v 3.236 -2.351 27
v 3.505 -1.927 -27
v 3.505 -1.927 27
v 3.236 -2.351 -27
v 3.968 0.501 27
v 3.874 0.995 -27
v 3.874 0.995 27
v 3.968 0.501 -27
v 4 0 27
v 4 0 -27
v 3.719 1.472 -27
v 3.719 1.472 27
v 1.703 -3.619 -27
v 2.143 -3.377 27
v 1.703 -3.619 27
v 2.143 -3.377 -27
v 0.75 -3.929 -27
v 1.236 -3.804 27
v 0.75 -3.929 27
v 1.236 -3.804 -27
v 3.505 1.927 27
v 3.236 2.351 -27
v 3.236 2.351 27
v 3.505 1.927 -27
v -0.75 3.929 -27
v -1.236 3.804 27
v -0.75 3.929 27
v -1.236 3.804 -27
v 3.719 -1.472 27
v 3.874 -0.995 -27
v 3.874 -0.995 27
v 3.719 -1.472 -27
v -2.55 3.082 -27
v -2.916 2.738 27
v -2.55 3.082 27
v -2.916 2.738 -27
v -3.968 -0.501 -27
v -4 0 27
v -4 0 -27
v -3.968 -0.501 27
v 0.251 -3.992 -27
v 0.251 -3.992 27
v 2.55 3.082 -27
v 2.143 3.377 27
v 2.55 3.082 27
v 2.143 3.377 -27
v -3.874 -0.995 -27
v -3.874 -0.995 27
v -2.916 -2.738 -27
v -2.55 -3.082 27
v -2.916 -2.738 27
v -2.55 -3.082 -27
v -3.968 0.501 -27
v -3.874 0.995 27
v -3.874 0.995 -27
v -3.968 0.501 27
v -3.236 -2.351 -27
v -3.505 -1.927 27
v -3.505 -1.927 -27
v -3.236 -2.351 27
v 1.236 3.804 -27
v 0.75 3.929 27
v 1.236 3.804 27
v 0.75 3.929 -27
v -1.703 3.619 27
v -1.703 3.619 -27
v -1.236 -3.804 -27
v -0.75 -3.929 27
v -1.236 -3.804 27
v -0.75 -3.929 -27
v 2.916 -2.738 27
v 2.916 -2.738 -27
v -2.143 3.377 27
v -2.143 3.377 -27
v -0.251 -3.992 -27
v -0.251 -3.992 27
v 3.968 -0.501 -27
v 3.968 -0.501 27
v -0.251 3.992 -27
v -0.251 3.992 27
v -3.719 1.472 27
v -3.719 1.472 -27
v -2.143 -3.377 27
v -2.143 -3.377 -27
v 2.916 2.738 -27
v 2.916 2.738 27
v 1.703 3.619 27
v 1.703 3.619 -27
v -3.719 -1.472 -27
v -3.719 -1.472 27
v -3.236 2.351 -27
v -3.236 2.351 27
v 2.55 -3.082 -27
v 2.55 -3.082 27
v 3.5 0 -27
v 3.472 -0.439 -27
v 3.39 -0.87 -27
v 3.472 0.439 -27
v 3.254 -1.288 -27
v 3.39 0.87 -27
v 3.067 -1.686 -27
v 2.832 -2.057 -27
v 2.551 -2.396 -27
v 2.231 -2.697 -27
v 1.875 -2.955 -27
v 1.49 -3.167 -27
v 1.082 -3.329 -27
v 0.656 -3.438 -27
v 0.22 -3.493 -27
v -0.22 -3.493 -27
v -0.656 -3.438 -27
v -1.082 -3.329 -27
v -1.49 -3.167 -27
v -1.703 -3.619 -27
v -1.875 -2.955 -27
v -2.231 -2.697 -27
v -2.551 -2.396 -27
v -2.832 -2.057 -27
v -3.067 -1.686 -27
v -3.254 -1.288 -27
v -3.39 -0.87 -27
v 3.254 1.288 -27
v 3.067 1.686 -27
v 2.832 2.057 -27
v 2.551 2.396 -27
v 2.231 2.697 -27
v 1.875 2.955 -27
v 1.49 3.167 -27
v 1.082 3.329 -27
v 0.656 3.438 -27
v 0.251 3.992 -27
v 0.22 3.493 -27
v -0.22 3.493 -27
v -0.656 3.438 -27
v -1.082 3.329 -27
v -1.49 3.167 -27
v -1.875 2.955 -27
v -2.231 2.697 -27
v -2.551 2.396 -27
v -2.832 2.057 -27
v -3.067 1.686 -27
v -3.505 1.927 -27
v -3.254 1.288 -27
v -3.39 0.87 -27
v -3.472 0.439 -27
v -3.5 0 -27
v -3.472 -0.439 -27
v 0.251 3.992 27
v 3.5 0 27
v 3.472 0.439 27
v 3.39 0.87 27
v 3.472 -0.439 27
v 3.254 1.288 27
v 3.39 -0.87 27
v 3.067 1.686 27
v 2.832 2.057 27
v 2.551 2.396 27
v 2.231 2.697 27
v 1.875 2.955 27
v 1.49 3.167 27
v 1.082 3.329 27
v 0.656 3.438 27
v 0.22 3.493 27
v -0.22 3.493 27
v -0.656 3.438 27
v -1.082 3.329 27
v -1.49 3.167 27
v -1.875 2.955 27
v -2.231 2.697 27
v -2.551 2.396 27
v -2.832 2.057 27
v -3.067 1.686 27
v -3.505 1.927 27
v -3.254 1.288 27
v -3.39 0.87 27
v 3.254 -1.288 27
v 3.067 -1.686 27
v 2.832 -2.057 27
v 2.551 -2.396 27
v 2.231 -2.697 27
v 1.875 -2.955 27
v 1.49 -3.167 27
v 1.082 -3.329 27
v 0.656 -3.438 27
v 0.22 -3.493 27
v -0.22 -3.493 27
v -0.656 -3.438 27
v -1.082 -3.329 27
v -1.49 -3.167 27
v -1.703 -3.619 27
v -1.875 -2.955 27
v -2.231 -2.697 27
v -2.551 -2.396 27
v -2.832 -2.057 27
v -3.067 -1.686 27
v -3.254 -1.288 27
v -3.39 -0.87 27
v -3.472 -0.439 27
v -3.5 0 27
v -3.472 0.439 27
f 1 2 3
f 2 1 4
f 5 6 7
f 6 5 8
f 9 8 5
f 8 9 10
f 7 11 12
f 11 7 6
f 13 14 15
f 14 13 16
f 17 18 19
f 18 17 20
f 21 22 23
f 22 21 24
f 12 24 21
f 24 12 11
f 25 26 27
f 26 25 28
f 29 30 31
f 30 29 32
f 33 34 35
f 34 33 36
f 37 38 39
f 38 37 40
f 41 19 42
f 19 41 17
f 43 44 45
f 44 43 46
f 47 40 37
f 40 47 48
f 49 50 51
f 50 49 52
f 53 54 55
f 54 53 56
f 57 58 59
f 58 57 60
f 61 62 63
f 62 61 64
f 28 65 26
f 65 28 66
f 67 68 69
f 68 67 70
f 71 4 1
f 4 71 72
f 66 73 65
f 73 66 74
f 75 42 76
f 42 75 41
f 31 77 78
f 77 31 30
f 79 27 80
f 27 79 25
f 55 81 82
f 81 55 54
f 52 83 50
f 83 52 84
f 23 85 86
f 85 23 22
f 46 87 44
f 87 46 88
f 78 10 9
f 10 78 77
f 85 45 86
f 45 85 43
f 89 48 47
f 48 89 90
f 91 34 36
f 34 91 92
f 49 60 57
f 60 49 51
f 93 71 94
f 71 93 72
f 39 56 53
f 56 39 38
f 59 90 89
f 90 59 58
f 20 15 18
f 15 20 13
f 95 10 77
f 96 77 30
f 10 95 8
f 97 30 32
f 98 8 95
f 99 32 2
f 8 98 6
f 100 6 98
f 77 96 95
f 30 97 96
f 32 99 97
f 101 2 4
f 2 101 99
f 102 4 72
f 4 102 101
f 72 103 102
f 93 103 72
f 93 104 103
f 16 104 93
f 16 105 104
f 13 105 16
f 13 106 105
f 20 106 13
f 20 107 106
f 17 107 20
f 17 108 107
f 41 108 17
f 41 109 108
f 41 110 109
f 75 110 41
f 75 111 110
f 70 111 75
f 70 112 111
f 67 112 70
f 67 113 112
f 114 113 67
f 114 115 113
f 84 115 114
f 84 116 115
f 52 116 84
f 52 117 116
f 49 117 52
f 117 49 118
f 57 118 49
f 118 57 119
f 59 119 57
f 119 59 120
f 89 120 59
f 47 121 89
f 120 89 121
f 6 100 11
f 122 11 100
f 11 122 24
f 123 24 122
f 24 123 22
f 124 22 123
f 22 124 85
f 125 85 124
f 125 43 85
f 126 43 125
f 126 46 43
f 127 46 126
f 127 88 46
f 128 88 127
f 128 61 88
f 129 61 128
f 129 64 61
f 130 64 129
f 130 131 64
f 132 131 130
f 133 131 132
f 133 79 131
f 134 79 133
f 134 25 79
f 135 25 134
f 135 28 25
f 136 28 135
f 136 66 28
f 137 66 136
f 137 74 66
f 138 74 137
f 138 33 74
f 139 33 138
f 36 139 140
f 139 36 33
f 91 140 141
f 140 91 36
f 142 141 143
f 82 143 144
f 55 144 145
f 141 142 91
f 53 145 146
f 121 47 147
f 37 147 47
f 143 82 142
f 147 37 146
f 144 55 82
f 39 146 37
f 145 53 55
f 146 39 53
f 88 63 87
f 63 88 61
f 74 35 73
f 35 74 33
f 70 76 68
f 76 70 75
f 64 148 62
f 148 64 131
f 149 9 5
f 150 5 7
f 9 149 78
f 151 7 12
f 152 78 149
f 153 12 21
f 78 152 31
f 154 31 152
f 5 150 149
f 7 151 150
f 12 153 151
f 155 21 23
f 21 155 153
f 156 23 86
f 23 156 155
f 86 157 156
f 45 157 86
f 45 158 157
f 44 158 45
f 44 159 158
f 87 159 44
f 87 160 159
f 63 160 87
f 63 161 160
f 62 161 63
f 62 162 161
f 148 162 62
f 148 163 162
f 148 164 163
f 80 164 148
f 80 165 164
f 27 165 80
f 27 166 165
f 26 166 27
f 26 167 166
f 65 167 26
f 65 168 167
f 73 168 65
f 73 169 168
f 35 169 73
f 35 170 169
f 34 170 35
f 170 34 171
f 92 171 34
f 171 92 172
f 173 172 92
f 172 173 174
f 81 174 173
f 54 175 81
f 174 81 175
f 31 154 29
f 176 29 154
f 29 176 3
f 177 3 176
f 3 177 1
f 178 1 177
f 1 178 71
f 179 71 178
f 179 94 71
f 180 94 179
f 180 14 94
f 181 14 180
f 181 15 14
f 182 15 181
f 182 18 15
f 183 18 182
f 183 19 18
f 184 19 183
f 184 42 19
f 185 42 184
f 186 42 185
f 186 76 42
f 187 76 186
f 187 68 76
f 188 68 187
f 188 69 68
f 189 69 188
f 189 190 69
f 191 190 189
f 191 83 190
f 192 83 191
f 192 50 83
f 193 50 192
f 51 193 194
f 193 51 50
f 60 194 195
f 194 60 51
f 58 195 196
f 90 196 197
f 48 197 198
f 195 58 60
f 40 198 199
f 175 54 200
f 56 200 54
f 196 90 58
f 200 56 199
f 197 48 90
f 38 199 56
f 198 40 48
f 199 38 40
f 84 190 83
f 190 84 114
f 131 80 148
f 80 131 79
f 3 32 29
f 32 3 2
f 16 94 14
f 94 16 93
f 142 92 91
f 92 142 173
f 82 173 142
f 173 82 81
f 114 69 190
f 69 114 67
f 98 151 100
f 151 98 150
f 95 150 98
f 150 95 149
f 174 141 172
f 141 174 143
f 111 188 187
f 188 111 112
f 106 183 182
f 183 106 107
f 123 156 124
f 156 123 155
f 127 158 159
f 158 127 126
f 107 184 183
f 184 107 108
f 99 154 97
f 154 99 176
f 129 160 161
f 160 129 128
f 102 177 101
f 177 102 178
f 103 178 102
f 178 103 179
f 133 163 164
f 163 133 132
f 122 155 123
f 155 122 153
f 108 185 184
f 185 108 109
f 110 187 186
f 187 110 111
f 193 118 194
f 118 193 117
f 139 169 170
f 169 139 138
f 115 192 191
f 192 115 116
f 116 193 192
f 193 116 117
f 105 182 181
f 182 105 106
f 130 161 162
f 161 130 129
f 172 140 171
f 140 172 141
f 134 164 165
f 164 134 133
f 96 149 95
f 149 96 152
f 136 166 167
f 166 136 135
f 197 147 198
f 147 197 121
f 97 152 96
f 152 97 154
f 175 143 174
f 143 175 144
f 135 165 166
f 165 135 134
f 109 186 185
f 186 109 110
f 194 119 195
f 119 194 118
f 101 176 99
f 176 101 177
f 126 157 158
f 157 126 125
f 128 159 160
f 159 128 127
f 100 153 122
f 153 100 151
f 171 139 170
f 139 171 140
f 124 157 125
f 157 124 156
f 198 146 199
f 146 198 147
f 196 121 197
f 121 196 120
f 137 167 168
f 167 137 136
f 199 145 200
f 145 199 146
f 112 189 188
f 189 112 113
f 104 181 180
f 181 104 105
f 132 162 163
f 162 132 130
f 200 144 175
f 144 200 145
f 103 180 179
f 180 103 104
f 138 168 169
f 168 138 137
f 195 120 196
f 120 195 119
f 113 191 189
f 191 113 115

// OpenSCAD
$fn = 50;


difference() {
	union() {
		translate(v = [0, 0, -27.0000000000]) {
			cylinder(h = 54, r = 4.0000000000);
		}
	}
	union() {
		translate(v = [0, 0, -100.0000000000]) {
			cylinder(h = 200, r = 3.5000000000);
		}
	}
}
